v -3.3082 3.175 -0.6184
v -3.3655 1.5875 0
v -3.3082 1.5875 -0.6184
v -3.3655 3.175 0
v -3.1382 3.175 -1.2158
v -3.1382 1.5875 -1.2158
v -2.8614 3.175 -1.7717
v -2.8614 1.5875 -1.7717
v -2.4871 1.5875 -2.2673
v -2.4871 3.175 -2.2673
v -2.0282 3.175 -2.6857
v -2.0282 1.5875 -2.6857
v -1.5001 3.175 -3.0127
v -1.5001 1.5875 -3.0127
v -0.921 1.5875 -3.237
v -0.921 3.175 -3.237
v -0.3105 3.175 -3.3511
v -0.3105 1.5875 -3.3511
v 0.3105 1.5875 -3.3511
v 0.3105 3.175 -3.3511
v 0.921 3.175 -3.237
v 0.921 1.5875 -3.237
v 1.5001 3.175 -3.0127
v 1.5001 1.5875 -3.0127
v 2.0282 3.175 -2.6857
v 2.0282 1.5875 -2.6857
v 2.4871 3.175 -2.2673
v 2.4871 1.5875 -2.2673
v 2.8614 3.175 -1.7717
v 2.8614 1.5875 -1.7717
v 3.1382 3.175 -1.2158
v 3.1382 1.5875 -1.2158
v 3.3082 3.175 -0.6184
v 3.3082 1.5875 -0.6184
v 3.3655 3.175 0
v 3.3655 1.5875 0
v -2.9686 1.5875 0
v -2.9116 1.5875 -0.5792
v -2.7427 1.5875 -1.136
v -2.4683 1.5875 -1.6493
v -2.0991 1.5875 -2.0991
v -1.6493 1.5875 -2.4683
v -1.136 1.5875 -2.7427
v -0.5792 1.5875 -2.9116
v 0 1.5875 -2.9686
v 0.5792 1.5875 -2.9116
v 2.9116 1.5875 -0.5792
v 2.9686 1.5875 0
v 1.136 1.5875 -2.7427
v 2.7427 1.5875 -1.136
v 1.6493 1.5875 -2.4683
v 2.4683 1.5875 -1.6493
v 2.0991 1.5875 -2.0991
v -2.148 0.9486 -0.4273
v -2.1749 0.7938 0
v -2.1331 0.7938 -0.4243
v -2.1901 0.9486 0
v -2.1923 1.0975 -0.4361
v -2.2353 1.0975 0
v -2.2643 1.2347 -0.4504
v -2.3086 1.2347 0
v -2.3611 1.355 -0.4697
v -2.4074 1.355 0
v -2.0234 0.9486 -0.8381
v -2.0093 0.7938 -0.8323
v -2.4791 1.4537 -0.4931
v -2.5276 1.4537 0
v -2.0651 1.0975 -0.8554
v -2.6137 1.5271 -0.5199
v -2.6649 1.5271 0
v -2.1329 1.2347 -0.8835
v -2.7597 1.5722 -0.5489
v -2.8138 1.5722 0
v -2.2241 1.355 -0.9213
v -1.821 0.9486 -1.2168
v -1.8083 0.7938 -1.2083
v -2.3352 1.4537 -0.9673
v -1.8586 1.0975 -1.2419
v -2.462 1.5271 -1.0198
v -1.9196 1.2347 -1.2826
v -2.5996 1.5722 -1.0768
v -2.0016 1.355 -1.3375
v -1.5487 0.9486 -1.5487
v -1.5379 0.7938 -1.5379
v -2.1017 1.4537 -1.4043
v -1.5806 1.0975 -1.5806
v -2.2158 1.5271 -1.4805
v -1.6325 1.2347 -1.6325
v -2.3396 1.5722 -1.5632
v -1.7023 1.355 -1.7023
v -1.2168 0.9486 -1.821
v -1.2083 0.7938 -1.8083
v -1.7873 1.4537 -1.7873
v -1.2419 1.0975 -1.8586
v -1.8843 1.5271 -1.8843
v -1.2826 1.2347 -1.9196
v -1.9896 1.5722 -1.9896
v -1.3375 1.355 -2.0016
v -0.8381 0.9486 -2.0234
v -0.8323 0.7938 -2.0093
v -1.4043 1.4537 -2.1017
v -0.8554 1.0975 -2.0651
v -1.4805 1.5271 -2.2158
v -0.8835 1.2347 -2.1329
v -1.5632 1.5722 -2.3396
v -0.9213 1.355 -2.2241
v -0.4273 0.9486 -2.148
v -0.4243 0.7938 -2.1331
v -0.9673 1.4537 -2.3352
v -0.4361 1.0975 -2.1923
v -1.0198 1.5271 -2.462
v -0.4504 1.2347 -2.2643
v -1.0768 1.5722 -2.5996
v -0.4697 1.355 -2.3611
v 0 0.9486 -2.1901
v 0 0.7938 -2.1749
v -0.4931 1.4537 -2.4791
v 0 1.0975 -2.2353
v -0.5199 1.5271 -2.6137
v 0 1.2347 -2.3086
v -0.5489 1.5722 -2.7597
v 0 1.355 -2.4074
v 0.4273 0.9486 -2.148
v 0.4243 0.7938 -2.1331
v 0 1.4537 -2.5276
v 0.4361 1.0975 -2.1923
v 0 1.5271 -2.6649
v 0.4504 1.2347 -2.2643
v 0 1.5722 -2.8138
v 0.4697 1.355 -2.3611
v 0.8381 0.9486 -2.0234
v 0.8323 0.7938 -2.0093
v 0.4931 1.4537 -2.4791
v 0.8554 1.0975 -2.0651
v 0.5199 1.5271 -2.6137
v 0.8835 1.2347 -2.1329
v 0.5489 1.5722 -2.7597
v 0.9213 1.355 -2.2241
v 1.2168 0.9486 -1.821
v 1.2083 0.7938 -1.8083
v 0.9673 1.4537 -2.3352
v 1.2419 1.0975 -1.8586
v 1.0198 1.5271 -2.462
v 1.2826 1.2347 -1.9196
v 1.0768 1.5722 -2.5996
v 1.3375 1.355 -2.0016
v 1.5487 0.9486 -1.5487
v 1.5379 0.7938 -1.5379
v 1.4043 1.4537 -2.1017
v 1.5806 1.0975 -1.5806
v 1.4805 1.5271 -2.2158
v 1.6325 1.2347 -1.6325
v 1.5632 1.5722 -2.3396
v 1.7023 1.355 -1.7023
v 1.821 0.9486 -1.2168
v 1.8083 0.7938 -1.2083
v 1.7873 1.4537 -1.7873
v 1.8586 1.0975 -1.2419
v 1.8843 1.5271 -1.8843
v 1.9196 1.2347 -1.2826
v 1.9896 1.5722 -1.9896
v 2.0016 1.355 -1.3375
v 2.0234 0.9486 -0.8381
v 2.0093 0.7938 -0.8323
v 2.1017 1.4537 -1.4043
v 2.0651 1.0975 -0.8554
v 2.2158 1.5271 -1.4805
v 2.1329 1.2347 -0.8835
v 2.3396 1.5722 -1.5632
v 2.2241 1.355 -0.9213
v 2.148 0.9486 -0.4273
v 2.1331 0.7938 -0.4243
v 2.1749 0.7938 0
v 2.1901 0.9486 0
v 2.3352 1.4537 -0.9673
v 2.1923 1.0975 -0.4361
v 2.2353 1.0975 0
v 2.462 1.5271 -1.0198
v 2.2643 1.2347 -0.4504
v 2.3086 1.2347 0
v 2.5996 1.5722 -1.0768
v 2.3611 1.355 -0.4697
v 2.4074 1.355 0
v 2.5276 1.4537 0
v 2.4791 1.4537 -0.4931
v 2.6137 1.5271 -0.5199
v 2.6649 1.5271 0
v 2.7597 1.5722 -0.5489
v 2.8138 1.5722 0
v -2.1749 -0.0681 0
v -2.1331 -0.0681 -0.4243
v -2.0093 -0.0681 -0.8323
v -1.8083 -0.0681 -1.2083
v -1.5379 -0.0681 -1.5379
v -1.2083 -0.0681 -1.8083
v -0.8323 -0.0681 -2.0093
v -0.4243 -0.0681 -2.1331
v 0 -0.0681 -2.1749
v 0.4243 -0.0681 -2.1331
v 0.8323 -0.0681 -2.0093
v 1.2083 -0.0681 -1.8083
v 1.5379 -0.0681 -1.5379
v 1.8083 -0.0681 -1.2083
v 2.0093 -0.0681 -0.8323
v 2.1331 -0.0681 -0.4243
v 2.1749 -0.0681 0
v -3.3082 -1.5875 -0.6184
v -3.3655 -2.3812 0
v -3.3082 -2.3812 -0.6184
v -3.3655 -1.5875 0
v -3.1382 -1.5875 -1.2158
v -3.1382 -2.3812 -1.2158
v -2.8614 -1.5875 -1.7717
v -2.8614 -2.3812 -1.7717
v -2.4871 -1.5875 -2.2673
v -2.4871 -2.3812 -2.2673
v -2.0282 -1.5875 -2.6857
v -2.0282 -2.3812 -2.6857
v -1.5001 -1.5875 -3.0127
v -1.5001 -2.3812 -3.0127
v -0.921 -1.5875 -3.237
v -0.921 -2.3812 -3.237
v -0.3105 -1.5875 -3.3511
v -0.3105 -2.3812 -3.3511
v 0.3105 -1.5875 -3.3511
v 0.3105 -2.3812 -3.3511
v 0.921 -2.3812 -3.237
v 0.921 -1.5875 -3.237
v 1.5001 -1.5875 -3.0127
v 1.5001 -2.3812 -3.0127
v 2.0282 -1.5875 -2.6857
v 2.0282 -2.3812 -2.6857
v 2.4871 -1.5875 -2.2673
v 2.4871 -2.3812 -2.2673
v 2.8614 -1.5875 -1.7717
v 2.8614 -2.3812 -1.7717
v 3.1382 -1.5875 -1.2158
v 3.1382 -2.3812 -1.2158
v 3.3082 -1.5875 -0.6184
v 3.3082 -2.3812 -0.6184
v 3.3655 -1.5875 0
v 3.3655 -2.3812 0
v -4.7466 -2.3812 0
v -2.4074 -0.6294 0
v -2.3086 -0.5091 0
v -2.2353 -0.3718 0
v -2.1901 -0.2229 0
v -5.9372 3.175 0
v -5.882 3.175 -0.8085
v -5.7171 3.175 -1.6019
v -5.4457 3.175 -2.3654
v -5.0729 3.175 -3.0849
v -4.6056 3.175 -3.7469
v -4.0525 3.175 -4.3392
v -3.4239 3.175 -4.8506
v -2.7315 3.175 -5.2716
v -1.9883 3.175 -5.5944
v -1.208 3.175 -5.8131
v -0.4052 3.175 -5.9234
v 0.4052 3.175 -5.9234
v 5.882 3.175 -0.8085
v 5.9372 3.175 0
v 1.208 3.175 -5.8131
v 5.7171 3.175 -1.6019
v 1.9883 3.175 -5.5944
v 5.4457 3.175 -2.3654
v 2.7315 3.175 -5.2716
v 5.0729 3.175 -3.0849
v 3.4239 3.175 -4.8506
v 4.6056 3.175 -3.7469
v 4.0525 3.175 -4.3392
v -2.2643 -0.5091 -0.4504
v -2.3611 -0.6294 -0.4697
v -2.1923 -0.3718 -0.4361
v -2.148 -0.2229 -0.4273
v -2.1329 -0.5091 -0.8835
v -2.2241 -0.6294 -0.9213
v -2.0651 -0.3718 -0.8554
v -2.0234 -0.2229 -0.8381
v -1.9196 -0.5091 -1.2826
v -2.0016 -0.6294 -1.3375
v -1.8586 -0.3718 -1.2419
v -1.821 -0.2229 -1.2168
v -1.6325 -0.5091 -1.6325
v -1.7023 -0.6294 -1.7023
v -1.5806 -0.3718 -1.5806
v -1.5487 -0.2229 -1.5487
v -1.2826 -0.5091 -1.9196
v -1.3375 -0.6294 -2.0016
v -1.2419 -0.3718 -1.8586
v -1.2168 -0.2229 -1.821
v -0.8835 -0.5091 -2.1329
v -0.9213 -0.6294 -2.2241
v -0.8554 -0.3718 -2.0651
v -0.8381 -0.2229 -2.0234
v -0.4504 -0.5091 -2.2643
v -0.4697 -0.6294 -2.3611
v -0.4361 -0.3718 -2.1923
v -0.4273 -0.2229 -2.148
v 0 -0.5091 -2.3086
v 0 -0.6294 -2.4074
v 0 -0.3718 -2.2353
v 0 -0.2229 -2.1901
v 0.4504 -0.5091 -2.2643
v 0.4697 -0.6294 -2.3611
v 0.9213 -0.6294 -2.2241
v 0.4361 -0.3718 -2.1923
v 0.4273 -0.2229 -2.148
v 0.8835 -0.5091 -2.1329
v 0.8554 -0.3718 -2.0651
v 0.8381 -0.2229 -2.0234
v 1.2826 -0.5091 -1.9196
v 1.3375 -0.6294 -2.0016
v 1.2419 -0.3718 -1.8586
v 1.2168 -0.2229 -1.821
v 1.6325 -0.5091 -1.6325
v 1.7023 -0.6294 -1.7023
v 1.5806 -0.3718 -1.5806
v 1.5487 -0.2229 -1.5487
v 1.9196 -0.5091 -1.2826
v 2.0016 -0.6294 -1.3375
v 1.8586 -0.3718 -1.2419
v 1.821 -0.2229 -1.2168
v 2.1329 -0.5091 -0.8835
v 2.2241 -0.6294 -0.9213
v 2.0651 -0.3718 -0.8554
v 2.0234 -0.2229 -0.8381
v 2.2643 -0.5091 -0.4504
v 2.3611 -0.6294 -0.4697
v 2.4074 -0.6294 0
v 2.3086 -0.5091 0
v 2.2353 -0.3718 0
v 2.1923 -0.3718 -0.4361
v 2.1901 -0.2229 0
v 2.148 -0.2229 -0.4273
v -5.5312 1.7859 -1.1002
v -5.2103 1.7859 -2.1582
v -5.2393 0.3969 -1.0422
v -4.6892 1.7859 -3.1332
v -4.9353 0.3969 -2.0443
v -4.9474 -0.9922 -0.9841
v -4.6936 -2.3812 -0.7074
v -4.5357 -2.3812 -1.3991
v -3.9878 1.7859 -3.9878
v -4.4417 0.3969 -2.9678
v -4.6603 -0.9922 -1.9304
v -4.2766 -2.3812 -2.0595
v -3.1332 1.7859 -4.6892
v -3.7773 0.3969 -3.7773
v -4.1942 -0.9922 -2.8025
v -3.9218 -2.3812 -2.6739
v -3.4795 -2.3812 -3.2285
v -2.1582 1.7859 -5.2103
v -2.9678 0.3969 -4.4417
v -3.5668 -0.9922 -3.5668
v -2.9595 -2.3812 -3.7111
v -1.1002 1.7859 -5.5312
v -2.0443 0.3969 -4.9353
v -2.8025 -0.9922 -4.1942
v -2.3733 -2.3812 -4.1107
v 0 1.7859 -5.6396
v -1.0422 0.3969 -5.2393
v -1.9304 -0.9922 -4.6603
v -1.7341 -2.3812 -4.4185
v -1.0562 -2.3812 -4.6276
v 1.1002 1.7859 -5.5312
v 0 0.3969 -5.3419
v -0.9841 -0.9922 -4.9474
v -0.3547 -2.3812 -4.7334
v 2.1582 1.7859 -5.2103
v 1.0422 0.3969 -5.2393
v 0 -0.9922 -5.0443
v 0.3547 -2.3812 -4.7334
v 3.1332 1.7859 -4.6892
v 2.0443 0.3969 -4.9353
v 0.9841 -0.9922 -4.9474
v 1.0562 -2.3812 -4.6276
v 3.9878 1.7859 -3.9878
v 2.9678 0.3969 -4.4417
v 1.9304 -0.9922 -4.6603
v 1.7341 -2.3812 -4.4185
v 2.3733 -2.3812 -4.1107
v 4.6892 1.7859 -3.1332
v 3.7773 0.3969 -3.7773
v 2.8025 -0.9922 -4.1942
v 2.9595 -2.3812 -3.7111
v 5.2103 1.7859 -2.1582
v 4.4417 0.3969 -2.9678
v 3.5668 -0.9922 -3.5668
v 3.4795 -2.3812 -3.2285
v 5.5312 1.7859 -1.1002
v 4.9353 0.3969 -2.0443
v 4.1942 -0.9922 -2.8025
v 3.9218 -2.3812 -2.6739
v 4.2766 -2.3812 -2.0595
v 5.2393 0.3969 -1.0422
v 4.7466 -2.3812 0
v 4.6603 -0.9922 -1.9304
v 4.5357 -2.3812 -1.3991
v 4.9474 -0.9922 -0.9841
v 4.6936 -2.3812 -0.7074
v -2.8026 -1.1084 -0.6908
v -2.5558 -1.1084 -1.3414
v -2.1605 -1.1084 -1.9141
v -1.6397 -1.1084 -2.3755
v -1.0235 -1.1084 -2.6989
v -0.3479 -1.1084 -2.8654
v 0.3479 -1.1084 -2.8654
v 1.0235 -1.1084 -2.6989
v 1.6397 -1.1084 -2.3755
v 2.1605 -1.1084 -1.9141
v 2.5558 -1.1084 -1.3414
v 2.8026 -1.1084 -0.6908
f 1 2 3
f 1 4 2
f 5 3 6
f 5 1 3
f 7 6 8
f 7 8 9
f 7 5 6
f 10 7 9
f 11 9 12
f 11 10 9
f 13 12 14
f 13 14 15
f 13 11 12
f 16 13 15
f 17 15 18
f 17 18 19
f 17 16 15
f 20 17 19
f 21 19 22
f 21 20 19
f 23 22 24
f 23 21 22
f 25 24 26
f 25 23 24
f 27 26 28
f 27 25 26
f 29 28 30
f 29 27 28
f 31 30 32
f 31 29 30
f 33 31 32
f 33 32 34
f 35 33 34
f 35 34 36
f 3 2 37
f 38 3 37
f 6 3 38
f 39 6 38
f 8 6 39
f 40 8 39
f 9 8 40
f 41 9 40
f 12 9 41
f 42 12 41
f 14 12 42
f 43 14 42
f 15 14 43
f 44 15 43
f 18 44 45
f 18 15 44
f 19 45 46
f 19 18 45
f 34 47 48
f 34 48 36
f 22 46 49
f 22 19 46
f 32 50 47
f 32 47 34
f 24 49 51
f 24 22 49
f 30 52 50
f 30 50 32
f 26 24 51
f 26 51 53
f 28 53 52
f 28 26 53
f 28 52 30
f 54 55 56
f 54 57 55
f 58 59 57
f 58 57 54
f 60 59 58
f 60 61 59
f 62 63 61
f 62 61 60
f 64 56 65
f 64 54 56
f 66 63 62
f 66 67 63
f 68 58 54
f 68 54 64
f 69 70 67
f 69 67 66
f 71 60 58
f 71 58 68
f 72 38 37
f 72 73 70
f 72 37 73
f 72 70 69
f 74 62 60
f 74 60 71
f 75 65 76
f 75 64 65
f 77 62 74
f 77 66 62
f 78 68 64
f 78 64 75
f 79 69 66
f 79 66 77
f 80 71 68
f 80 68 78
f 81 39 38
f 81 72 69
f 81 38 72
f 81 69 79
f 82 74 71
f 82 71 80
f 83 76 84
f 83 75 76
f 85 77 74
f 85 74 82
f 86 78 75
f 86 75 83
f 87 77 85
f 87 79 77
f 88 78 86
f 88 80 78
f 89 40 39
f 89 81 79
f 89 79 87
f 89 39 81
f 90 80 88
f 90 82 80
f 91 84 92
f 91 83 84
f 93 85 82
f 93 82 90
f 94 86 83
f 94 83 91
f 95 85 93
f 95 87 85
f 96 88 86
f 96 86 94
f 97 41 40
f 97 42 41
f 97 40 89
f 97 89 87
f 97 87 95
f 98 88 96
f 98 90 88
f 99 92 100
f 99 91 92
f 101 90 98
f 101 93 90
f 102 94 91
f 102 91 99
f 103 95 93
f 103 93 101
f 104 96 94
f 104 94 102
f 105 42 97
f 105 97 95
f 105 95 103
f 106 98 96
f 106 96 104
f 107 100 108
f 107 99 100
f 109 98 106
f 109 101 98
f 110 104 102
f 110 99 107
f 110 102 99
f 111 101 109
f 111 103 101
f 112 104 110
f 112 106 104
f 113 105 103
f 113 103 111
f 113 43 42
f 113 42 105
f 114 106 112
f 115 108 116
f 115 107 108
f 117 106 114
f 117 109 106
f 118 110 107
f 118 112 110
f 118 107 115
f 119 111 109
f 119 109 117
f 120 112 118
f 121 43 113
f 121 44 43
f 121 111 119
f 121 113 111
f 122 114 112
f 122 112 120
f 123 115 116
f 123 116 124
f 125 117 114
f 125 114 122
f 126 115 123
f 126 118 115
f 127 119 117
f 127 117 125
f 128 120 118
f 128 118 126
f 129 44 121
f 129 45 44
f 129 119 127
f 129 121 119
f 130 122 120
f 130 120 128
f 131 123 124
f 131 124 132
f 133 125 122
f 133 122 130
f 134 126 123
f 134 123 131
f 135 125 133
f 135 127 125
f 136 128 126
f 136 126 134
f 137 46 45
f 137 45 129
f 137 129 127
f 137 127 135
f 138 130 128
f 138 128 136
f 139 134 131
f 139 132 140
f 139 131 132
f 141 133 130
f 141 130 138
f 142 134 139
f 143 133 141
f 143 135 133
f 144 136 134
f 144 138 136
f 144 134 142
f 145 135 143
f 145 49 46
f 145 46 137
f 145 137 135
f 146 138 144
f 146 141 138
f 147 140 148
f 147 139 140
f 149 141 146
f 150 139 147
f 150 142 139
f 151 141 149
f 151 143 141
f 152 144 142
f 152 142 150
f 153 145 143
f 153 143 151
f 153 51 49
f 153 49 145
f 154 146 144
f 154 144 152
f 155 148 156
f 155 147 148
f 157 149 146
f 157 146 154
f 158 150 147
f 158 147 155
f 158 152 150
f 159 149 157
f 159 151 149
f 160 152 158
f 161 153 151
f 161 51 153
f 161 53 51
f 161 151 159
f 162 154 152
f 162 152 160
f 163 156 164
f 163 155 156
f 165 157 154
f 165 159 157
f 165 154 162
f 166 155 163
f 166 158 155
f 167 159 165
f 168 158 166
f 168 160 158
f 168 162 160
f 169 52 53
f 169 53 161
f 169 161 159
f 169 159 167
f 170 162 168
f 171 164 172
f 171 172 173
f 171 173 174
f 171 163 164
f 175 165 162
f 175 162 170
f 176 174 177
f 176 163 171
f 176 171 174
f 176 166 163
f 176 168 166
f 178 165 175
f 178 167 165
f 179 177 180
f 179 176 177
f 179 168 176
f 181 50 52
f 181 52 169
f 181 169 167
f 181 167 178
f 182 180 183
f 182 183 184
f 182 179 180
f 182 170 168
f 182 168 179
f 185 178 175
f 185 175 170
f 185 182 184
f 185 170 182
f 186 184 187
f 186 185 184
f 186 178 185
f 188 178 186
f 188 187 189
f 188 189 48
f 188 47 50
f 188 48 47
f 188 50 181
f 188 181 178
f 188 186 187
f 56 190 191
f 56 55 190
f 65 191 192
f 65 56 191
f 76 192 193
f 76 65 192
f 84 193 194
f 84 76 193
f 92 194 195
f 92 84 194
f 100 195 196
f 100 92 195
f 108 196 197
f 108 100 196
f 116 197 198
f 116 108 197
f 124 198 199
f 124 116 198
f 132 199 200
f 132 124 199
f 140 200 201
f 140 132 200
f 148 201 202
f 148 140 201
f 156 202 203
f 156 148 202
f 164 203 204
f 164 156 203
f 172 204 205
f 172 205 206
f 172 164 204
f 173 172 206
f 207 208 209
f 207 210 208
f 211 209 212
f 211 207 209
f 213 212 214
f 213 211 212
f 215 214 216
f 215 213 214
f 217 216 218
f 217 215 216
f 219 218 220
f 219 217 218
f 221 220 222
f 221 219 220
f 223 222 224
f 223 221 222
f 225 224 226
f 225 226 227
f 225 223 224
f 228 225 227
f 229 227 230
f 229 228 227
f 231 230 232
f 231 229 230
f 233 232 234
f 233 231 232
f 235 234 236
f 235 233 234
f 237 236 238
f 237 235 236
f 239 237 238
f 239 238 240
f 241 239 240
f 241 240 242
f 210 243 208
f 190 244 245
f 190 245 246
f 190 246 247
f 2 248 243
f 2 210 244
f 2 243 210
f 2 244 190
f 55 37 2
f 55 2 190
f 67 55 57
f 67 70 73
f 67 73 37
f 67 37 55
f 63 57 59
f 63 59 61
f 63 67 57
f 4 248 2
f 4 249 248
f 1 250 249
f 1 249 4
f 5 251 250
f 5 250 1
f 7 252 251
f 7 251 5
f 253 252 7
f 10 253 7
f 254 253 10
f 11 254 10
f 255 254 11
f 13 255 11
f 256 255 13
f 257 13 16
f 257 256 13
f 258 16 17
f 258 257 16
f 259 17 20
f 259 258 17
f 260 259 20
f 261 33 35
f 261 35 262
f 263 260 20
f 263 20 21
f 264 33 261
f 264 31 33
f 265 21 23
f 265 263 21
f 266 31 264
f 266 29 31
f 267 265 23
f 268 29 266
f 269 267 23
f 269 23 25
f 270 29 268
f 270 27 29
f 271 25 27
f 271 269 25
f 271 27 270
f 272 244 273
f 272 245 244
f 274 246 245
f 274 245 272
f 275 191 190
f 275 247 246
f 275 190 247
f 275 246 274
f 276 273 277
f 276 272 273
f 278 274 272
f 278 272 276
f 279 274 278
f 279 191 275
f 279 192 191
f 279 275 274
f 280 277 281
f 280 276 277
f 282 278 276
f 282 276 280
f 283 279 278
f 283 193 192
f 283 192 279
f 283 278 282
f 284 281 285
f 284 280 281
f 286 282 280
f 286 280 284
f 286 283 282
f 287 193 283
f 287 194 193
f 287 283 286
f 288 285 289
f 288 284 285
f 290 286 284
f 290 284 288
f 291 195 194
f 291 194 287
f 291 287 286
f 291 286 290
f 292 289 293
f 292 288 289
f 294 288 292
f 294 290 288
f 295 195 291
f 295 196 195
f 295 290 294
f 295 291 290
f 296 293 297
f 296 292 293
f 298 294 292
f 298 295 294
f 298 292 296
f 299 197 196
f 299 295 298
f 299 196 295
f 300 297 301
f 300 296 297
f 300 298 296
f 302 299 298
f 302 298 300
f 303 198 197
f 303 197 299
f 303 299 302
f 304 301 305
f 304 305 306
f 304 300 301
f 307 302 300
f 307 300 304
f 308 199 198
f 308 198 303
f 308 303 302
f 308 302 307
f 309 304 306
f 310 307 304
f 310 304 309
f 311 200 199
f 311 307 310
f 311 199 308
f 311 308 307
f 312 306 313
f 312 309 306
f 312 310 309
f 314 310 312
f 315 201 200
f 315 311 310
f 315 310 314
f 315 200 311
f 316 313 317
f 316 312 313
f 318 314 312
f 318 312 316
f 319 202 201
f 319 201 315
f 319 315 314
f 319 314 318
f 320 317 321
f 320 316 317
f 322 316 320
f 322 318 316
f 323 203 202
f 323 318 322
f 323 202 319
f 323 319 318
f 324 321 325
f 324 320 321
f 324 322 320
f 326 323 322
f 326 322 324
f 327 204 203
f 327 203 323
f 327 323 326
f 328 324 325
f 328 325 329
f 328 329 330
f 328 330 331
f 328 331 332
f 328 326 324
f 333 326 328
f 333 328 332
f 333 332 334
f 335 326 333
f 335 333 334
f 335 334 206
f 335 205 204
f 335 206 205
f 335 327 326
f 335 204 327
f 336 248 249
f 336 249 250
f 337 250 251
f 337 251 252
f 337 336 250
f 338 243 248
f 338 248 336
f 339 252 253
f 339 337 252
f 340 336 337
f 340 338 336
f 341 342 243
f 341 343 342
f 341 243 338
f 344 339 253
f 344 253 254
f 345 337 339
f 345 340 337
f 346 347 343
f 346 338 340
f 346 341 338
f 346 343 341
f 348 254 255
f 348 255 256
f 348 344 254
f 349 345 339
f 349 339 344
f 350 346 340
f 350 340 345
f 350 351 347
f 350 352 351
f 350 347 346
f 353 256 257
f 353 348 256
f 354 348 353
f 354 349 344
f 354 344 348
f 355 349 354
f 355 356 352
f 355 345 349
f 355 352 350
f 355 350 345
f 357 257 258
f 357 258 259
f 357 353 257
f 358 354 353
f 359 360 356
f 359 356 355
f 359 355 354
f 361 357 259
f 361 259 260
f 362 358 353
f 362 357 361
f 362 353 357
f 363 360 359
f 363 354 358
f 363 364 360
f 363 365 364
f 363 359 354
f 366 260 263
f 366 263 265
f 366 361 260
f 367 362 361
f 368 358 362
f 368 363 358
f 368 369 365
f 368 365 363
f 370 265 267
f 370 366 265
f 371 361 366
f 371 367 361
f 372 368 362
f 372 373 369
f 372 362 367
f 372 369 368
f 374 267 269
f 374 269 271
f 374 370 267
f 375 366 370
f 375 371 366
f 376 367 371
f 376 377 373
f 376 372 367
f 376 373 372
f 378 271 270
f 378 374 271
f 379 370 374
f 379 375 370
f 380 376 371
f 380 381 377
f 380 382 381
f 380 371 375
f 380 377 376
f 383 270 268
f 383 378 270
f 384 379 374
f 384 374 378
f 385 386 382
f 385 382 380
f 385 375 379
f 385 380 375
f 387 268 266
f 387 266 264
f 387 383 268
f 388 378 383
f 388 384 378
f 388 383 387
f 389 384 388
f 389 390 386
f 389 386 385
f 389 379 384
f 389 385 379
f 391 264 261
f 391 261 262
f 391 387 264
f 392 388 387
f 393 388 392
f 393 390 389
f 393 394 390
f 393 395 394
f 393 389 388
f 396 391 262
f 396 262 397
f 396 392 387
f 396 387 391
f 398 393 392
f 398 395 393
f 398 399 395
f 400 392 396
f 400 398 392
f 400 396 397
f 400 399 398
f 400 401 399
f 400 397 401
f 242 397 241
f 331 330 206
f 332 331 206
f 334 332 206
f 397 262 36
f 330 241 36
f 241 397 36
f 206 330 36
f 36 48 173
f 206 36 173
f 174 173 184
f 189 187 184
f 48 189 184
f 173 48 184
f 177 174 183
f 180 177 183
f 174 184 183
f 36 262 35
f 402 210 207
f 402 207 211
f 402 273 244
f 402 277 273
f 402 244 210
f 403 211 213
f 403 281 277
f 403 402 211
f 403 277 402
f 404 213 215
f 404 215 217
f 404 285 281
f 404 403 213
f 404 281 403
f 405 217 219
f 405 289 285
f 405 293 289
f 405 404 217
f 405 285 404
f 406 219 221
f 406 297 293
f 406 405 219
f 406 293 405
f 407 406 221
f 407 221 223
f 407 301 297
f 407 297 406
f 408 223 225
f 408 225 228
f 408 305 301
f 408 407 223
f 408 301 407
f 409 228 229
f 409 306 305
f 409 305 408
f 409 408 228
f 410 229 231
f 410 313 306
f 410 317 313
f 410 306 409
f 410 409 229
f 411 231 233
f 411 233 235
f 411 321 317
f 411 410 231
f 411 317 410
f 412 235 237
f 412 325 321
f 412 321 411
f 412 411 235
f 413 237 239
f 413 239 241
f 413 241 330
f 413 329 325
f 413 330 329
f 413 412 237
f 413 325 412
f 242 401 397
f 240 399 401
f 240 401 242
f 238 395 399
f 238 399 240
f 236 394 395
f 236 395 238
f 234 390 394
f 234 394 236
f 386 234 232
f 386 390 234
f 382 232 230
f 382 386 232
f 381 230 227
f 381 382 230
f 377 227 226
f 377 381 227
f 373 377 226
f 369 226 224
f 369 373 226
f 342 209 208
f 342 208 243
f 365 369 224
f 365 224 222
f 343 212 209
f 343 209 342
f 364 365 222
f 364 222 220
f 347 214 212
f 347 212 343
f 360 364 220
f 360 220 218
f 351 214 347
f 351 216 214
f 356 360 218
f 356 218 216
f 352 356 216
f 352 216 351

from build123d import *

# Parameters (mm, degrees)
REVOLVE1_ANGLE = 180


with BuildPart() as part:
    # Sketch1 → Revolve1 (revolve)
    with BuildSketch(Plane.XY):
        with BuildLine():
            Line((-3.3655, 1.5875), (-3.3655, 3.175))
            Line((-3.3655, 3.175), (-5.93725, 3.175))
            Line((-5.93725, 3.175), (-4.746625, -2.38125))
            Line((-4.746625, -2.38125), (-3.3655, -2.38125))
            Line((-3.3655, -2.38125), (-3.3655, -1.5875))
            Line((-3.3655, -1.5875), (-2.407358992, -0.629358992))
            ThreePointArc((-2.407358992, -0.629358992), (-2.235295621, -0.371847959), (-2.174875, -0.068092985))
            Line((-2.174875, -0.068092985), (-2.174875, 0.79375))
            ThreePointArc((-2.174875, 0.79375), (-2.407358992, 1.355016008), (-2.968625, 1.5875))
            Line((-2.968625, 1.5875), (-3.3655, 1.5875))
        make_face()
    revolve(axis=Axis((0, 1.5875, 0), (0, -1, 0)), revolution_arc=REVOLVE1_ANGLE)


solid = part.part
